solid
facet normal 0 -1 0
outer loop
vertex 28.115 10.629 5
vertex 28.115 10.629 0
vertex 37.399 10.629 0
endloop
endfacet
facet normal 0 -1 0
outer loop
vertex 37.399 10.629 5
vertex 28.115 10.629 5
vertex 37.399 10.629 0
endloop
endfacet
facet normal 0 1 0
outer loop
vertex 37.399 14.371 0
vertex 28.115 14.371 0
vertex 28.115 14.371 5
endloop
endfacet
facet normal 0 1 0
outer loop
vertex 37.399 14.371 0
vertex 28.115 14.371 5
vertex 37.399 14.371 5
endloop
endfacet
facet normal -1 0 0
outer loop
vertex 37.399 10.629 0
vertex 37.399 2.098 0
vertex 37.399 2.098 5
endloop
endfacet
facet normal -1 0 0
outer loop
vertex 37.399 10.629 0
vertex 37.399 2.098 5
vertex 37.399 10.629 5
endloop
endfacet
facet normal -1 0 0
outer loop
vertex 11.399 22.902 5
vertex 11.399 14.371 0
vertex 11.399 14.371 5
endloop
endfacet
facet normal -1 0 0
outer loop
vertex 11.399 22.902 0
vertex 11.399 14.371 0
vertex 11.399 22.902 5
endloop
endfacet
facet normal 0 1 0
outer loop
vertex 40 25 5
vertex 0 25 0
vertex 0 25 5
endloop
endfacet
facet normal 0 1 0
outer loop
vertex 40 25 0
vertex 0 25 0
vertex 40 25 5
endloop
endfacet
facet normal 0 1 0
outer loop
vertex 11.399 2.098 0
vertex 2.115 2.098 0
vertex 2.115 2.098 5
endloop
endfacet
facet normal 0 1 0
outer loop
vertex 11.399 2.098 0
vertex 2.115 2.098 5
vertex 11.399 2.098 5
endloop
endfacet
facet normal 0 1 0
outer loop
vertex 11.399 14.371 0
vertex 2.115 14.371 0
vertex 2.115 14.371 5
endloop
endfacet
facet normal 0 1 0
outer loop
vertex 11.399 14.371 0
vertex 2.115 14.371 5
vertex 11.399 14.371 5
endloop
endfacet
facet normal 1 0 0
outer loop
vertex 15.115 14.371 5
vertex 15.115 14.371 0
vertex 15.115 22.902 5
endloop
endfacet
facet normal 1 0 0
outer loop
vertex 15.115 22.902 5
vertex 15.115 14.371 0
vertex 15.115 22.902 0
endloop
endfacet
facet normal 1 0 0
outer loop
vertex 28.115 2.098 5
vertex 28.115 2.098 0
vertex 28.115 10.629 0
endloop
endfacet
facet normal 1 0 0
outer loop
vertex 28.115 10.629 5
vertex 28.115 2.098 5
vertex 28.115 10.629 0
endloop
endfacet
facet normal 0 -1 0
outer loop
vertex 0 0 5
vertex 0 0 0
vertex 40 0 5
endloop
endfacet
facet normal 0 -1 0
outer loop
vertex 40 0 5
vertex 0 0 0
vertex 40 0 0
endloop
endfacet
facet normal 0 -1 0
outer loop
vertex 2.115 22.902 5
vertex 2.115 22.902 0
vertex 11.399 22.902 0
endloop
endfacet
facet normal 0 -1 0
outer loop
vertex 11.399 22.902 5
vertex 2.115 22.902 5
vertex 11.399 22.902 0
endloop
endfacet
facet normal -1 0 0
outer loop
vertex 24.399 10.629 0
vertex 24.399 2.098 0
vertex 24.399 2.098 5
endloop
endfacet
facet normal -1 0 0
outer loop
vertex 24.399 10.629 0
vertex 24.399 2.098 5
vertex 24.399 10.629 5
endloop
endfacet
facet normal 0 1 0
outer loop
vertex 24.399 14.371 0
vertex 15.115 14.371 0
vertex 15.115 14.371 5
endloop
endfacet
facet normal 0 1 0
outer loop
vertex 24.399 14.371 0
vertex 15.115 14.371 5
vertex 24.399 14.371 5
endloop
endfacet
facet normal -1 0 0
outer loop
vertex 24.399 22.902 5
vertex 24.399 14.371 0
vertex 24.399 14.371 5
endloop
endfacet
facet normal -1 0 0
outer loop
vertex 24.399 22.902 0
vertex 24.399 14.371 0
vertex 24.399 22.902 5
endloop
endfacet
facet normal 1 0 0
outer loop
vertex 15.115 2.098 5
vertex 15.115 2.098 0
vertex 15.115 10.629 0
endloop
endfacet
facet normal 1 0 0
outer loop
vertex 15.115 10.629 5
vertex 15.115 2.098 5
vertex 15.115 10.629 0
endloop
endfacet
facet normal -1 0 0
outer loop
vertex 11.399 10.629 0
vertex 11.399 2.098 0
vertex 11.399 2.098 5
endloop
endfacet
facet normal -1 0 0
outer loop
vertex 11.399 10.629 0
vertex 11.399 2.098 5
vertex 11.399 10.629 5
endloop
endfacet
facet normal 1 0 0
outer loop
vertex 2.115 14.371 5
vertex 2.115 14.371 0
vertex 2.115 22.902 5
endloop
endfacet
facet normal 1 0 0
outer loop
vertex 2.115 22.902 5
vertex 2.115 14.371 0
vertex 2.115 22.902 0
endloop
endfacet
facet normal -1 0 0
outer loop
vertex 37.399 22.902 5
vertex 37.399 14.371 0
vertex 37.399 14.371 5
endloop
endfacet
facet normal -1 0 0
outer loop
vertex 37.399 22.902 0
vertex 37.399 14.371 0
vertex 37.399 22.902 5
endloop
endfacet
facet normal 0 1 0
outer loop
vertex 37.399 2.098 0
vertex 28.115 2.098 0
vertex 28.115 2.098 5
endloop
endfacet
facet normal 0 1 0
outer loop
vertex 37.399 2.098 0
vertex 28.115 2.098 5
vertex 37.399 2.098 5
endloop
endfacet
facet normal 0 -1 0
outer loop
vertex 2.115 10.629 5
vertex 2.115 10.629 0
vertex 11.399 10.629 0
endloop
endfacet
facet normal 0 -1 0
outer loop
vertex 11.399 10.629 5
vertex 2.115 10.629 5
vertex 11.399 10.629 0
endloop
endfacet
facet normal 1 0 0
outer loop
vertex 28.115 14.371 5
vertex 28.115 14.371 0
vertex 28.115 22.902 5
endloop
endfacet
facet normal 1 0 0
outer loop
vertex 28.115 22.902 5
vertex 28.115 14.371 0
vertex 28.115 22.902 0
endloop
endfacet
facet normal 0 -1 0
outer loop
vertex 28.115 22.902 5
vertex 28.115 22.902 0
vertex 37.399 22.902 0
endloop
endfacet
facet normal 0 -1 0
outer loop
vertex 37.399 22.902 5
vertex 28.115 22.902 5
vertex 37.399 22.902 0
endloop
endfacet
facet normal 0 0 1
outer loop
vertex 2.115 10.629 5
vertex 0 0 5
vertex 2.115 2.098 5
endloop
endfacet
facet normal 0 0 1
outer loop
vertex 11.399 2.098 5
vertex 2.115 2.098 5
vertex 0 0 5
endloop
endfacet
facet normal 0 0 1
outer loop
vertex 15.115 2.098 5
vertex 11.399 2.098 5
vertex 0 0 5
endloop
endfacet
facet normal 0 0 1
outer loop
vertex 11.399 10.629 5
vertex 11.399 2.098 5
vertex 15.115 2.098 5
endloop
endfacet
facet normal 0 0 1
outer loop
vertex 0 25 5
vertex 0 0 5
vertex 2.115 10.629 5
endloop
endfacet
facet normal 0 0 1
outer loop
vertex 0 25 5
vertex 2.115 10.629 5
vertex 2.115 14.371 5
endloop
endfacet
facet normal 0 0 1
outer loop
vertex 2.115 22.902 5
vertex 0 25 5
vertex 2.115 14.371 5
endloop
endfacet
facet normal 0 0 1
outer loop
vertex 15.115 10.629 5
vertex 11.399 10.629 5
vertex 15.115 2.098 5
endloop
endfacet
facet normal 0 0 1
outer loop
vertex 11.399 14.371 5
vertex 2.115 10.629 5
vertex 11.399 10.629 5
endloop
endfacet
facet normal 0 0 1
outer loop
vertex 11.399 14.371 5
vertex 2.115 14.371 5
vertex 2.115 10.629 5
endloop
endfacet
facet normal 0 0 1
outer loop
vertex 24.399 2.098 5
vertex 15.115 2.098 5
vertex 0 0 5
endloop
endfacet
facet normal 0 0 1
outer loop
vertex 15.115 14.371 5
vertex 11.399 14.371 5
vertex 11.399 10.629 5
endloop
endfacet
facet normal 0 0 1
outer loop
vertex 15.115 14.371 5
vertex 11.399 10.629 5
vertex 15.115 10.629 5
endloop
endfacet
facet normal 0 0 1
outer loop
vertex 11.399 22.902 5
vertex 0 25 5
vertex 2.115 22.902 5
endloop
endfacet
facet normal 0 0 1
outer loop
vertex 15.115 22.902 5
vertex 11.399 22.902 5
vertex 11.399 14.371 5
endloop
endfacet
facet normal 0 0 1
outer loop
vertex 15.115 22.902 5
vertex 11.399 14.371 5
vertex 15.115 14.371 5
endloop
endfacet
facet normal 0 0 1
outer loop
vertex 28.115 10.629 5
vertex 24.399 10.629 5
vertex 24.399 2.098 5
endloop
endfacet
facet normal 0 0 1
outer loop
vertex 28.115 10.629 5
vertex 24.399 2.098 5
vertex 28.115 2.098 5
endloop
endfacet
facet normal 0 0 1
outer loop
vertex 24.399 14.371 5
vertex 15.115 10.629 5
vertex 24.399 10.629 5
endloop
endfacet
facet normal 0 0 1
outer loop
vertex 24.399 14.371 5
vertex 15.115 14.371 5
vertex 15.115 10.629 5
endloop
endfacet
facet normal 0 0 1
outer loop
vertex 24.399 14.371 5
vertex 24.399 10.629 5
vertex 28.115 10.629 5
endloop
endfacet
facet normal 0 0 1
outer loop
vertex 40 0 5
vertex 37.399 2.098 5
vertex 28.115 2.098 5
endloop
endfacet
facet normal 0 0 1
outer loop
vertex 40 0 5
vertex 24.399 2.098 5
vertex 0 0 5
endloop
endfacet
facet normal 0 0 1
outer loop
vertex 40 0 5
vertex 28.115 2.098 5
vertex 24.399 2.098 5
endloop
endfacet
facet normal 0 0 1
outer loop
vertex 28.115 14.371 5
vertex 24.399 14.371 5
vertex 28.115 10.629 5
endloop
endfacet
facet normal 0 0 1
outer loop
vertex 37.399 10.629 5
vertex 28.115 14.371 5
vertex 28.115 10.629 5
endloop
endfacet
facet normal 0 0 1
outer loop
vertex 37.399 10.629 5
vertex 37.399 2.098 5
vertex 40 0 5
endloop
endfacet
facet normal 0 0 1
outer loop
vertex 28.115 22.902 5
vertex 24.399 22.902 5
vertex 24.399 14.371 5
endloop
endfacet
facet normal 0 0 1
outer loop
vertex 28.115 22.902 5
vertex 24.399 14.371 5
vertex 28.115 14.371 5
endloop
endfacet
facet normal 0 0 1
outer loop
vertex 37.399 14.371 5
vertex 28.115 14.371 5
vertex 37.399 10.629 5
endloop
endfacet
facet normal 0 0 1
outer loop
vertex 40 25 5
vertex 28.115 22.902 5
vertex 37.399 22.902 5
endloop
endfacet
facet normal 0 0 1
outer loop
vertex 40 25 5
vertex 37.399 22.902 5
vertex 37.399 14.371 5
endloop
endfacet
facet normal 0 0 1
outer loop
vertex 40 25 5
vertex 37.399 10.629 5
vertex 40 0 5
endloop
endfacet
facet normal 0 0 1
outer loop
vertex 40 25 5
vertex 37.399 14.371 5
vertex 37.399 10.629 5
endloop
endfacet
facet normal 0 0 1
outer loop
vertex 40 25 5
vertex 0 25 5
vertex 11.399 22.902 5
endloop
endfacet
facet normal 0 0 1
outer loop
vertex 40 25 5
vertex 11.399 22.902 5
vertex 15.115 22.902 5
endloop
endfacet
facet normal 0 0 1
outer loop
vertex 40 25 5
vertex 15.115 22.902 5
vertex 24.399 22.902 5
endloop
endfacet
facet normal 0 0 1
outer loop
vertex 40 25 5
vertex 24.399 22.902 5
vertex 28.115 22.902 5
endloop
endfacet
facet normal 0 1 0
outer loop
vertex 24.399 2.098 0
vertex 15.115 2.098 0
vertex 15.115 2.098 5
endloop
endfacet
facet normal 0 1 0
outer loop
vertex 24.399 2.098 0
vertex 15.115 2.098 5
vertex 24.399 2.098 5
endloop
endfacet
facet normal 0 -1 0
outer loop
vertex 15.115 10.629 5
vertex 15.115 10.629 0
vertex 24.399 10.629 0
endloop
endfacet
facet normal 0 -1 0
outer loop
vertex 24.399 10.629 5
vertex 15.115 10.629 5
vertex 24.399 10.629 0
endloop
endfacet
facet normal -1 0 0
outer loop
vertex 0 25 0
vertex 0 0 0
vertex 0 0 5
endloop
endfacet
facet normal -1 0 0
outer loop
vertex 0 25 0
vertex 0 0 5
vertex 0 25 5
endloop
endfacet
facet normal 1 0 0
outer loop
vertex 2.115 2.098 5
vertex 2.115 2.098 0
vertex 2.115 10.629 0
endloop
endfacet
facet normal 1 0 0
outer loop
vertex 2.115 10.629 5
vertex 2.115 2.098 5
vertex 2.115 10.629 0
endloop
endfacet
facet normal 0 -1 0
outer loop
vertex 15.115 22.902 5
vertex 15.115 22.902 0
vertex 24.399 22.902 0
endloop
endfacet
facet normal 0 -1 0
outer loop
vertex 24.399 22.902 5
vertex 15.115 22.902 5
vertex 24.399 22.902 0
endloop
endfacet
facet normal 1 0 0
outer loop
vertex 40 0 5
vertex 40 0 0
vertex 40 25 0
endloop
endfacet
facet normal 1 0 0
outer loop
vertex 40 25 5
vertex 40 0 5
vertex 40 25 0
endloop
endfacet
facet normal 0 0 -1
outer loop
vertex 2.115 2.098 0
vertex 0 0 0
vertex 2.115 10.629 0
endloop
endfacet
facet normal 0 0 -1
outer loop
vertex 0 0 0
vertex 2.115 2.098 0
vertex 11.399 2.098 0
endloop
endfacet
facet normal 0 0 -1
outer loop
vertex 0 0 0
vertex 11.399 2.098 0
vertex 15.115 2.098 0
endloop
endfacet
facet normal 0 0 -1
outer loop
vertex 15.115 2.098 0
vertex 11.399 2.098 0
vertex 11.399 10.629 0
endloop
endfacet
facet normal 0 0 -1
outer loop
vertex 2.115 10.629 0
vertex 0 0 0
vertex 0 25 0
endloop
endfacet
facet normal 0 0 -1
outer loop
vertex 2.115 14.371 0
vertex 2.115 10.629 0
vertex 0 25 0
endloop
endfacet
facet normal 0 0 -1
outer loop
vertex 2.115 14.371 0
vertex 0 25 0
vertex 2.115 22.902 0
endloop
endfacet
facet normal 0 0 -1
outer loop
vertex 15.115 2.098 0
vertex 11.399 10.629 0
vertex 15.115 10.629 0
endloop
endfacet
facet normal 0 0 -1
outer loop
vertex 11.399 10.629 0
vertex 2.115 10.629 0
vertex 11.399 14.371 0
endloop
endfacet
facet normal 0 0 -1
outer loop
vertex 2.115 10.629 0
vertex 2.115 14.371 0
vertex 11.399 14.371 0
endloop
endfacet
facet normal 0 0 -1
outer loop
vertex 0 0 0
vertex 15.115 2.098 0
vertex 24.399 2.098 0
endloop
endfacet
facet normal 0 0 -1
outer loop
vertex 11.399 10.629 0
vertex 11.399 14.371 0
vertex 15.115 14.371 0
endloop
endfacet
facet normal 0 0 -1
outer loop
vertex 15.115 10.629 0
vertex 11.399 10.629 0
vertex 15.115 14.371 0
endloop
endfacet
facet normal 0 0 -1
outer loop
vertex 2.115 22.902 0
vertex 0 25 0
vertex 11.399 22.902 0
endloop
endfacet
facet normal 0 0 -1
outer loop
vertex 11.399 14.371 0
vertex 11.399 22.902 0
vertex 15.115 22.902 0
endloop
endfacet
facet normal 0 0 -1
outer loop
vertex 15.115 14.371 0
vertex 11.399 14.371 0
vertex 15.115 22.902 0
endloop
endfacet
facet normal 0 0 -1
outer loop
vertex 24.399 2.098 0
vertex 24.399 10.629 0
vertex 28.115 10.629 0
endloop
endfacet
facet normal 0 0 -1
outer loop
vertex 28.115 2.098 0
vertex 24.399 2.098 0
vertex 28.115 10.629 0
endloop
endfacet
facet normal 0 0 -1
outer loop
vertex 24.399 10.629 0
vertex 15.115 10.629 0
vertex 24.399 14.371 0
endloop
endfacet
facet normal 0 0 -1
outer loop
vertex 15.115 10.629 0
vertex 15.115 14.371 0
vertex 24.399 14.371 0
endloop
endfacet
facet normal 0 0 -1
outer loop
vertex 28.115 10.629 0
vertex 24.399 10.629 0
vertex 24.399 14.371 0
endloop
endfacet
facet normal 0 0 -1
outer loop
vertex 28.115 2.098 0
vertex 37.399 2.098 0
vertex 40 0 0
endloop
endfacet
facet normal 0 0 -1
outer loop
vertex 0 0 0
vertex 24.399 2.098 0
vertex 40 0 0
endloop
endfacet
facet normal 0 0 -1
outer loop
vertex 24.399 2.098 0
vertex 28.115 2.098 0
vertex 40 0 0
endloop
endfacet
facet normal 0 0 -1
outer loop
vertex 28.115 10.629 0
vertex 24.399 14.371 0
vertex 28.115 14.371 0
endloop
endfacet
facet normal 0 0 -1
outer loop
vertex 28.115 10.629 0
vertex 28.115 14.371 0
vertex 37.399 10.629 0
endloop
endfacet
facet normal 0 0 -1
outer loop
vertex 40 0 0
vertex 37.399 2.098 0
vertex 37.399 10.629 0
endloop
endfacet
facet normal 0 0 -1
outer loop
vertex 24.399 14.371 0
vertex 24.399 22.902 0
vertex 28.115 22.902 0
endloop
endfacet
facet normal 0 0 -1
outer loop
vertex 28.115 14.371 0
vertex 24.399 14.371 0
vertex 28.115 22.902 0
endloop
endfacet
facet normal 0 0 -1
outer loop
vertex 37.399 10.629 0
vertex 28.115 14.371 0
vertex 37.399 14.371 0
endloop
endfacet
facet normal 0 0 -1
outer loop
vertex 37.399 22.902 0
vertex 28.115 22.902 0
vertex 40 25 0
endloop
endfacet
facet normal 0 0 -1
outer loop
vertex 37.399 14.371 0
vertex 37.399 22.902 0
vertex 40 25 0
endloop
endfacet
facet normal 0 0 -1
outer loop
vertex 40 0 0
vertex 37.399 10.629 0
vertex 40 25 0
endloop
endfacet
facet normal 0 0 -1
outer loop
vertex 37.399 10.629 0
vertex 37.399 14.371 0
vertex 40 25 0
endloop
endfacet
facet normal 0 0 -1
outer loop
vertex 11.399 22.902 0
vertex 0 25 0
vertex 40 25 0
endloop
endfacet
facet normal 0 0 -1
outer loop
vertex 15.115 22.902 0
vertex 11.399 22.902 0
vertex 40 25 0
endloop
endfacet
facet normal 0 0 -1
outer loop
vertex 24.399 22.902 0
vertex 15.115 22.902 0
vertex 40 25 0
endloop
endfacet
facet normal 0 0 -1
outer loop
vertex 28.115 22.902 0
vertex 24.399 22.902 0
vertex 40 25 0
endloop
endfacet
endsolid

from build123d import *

# Parameters (mm, degrees)
F0_W     = 40
F0_H     = 25
F0_W_2   = 9.283639
F0_H_2   = 8.530912
F1_DEPTH = 5


with BuildPart() as f1:
    # F0 (on Top) → F1 (new body)
    with BuildSketch(Plane.XY):
        with Locations((20, 12.5)):
            Rectangle(F0_W, F0_H)
        with Locations((6.75697, 6.363504)):
            Rectangle(F0_W_2, F0_H_2, mode=Mode.SUBTRACT)
        with Locations((19.75697, 6.363504)):
            Rectangle(F0_W_2, F0_H_2, mode=Mode.SUBTRACT)
        with Locations((32.75697, 6.363504)):
            Rectangle(F0_W_2, F0_H_2, mode=Mode.SUBTRACT)
        with Locations((6.75697, 18.636496)):
            Rectangle(F0_W_2, F0_H_2, mode=Mode.SUBTRACT)
        with Locations((19.75697, 18.636496)):
            Rectangle(F0_W_2, F0_H_2, mode=Mode.SUBTRACT)
        with Locations((32.75697, 18.636496)):
            Rectangle(F0_W_2, F0_H_2, mode=Mode.SUBTRACT)
    extrude(amount=F1_DEPTH)


solid = f1.part
